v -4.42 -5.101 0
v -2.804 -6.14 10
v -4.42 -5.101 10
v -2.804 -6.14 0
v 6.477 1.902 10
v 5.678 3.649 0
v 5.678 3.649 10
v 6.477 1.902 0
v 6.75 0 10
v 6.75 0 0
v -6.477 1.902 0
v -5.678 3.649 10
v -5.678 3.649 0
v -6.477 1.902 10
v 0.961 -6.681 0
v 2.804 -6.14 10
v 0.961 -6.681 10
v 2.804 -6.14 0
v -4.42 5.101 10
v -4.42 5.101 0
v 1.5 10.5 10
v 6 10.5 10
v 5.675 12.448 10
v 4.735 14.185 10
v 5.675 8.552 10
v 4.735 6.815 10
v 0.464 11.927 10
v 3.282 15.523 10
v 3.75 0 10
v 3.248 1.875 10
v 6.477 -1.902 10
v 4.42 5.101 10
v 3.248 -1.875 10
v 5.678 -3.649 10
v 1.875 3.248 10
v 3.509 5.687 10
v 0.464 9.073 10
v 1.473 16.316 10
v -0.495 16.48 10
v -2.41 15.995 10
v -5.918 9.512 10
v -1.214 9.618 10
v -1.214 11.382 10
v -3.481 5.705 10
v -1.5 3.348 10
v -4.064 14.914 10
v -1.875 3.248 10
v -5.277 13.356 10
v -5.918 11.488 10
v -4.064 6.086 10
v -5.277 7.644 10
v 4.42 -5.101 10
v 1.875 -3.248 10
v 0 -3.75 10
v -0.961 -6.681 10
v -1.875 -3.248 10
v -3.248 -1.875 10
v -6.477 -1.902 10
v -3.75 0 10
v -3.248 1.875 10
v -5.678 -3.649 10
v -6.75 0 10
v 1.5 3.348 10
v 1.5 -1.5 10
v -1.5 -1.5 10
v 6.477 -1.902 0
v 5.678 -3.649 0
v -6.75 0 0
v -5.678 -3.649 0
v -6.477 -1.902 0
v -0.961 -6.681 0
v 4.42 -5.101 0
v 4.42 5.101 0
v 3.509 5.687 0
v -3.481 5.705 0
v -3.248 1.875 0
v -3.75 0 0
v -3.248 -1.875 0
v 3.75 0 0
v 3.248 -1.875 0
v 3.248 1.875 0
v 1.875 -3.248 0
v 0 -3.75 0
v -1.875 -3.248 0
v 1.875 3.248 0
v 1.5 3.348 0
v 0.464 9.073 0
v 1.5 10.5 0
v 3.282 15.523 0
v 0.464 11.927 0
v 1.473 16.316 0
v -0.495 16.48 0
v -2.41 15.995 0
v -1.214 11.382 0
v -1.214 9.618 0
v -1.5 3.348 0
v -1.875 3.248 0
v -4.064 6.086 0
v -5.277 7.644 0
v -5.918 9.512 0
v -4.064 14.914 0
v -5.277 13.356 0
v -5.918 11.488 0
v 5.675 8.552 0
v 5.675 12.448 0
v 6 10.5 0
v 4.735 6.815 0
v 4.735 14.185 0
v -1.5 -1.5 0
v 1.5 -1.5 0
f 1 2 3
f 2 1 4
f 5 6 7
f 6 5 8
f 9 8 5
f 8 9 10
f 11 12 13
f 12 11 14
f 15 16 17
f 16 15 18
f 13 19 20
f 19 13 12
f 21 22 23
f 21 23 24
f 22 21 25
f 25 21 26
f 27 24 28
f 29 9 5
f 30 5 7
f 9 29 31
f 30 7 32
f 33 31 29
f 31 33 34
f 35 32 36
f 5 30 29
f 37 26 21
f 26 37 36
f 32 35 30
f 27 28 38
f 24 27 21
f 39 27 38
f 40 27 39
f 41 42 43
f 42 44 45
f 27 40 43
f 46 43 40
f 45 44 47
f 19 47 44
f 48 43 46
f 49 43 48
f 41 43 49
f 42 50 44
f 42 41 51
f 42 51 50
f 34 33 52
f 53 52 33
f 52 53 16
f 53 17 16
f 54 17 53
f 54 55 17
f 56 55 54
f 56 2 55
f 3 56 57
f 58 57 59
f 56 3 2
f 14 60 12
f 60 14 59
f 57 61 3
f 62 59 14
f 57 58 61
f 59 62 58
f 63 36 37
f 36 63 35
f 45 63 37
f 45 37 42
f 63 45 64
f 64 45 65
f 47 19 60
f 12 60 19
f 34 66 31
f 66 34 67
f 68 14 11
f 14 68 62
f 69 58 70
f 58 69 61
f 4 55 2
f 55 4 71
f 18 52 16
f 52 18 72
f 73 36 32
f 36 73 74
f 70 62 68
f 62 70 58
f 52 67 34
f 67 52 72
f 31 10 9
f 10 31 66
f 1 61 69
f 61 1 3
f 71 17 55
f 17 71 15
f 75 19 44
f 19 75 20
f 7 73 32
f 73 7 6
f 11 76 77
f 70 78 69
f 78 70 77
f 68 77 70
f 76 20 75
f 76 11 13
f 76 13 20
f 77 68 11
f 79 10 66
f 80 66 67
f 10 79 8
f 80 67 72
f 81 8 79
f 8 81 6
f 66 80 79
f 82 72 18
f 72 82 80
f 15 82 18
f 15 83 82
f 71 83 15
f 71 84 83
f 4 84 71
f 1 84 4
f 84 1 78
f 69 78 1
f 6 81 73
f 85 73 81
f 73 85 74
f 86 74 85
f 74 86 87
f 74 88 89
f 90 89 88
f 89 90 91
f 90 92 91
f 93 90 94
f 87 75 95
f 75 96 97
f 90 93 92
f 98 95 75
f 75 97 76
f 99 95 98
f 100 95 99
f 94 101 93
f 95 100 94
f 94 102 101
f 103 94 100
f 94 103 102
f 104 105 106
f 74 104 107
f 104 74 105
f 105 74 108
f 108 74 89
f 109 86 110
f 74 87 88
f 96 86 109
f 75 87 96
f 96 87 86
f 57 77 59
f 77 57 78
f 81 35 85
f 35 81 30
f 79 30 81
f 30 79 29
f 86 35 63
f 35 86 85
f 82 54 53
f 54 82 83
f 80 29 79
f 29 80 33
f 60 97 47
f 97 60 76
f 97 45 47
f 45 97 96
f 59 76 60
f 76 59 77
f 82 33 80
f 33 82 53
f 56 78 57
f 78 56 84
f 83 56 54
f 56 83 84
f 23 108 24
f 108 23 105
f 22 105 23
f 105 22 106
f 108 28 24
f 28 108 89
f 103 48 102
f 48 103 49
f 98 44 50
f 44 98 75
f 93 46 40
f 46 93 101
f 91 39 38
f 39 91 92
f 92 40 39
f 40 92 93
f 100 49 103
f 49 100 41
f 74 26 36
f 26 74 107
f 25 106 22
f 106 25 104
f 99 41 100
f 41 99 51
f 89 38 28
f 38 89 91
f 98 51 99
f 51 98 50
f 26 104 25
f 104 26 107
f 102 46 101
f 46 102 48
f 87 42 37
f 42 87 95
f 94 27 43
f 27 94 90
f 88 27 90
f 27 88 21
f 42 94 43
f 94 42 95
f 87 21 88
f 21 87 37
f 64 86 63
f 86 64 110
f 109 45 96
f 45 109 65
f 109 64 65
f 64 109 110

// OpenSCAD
ball_od = 50;
ball_offset = 50;
thick = 3;
height = 10;

union() {
	difference() {
		cylinder(d = (7.5 + (2 * thick)), h = height);
		translate(v = [0, 0, (-(height / 2))]) {
			cylinder(d = 7.5000000000, h = (2 * height));
		}
	}
	translate(v = [0, (ball_offset - ((ball_od / 2) + 14.5)), 0]) {
		difference() {
			cylinder(d = (3 + (3 * thick)), h = height);
			translate(v = [0, 0, (-(height / 2))]) {
				cylinder(d = 3, h = (2 * height));
			}
		}
	}
	translate(v = [0, (((ball_offset - ((ball_od / 2) + 14.5)) / 2) - (thick / 2)), 0]) {
		translate(v = [0, 0, (height / 2)]) {
			cube(center = true, size = [thick, (ball_offset - ((ball_od / 2) + 14.5)), height]);
		}
	}
}
